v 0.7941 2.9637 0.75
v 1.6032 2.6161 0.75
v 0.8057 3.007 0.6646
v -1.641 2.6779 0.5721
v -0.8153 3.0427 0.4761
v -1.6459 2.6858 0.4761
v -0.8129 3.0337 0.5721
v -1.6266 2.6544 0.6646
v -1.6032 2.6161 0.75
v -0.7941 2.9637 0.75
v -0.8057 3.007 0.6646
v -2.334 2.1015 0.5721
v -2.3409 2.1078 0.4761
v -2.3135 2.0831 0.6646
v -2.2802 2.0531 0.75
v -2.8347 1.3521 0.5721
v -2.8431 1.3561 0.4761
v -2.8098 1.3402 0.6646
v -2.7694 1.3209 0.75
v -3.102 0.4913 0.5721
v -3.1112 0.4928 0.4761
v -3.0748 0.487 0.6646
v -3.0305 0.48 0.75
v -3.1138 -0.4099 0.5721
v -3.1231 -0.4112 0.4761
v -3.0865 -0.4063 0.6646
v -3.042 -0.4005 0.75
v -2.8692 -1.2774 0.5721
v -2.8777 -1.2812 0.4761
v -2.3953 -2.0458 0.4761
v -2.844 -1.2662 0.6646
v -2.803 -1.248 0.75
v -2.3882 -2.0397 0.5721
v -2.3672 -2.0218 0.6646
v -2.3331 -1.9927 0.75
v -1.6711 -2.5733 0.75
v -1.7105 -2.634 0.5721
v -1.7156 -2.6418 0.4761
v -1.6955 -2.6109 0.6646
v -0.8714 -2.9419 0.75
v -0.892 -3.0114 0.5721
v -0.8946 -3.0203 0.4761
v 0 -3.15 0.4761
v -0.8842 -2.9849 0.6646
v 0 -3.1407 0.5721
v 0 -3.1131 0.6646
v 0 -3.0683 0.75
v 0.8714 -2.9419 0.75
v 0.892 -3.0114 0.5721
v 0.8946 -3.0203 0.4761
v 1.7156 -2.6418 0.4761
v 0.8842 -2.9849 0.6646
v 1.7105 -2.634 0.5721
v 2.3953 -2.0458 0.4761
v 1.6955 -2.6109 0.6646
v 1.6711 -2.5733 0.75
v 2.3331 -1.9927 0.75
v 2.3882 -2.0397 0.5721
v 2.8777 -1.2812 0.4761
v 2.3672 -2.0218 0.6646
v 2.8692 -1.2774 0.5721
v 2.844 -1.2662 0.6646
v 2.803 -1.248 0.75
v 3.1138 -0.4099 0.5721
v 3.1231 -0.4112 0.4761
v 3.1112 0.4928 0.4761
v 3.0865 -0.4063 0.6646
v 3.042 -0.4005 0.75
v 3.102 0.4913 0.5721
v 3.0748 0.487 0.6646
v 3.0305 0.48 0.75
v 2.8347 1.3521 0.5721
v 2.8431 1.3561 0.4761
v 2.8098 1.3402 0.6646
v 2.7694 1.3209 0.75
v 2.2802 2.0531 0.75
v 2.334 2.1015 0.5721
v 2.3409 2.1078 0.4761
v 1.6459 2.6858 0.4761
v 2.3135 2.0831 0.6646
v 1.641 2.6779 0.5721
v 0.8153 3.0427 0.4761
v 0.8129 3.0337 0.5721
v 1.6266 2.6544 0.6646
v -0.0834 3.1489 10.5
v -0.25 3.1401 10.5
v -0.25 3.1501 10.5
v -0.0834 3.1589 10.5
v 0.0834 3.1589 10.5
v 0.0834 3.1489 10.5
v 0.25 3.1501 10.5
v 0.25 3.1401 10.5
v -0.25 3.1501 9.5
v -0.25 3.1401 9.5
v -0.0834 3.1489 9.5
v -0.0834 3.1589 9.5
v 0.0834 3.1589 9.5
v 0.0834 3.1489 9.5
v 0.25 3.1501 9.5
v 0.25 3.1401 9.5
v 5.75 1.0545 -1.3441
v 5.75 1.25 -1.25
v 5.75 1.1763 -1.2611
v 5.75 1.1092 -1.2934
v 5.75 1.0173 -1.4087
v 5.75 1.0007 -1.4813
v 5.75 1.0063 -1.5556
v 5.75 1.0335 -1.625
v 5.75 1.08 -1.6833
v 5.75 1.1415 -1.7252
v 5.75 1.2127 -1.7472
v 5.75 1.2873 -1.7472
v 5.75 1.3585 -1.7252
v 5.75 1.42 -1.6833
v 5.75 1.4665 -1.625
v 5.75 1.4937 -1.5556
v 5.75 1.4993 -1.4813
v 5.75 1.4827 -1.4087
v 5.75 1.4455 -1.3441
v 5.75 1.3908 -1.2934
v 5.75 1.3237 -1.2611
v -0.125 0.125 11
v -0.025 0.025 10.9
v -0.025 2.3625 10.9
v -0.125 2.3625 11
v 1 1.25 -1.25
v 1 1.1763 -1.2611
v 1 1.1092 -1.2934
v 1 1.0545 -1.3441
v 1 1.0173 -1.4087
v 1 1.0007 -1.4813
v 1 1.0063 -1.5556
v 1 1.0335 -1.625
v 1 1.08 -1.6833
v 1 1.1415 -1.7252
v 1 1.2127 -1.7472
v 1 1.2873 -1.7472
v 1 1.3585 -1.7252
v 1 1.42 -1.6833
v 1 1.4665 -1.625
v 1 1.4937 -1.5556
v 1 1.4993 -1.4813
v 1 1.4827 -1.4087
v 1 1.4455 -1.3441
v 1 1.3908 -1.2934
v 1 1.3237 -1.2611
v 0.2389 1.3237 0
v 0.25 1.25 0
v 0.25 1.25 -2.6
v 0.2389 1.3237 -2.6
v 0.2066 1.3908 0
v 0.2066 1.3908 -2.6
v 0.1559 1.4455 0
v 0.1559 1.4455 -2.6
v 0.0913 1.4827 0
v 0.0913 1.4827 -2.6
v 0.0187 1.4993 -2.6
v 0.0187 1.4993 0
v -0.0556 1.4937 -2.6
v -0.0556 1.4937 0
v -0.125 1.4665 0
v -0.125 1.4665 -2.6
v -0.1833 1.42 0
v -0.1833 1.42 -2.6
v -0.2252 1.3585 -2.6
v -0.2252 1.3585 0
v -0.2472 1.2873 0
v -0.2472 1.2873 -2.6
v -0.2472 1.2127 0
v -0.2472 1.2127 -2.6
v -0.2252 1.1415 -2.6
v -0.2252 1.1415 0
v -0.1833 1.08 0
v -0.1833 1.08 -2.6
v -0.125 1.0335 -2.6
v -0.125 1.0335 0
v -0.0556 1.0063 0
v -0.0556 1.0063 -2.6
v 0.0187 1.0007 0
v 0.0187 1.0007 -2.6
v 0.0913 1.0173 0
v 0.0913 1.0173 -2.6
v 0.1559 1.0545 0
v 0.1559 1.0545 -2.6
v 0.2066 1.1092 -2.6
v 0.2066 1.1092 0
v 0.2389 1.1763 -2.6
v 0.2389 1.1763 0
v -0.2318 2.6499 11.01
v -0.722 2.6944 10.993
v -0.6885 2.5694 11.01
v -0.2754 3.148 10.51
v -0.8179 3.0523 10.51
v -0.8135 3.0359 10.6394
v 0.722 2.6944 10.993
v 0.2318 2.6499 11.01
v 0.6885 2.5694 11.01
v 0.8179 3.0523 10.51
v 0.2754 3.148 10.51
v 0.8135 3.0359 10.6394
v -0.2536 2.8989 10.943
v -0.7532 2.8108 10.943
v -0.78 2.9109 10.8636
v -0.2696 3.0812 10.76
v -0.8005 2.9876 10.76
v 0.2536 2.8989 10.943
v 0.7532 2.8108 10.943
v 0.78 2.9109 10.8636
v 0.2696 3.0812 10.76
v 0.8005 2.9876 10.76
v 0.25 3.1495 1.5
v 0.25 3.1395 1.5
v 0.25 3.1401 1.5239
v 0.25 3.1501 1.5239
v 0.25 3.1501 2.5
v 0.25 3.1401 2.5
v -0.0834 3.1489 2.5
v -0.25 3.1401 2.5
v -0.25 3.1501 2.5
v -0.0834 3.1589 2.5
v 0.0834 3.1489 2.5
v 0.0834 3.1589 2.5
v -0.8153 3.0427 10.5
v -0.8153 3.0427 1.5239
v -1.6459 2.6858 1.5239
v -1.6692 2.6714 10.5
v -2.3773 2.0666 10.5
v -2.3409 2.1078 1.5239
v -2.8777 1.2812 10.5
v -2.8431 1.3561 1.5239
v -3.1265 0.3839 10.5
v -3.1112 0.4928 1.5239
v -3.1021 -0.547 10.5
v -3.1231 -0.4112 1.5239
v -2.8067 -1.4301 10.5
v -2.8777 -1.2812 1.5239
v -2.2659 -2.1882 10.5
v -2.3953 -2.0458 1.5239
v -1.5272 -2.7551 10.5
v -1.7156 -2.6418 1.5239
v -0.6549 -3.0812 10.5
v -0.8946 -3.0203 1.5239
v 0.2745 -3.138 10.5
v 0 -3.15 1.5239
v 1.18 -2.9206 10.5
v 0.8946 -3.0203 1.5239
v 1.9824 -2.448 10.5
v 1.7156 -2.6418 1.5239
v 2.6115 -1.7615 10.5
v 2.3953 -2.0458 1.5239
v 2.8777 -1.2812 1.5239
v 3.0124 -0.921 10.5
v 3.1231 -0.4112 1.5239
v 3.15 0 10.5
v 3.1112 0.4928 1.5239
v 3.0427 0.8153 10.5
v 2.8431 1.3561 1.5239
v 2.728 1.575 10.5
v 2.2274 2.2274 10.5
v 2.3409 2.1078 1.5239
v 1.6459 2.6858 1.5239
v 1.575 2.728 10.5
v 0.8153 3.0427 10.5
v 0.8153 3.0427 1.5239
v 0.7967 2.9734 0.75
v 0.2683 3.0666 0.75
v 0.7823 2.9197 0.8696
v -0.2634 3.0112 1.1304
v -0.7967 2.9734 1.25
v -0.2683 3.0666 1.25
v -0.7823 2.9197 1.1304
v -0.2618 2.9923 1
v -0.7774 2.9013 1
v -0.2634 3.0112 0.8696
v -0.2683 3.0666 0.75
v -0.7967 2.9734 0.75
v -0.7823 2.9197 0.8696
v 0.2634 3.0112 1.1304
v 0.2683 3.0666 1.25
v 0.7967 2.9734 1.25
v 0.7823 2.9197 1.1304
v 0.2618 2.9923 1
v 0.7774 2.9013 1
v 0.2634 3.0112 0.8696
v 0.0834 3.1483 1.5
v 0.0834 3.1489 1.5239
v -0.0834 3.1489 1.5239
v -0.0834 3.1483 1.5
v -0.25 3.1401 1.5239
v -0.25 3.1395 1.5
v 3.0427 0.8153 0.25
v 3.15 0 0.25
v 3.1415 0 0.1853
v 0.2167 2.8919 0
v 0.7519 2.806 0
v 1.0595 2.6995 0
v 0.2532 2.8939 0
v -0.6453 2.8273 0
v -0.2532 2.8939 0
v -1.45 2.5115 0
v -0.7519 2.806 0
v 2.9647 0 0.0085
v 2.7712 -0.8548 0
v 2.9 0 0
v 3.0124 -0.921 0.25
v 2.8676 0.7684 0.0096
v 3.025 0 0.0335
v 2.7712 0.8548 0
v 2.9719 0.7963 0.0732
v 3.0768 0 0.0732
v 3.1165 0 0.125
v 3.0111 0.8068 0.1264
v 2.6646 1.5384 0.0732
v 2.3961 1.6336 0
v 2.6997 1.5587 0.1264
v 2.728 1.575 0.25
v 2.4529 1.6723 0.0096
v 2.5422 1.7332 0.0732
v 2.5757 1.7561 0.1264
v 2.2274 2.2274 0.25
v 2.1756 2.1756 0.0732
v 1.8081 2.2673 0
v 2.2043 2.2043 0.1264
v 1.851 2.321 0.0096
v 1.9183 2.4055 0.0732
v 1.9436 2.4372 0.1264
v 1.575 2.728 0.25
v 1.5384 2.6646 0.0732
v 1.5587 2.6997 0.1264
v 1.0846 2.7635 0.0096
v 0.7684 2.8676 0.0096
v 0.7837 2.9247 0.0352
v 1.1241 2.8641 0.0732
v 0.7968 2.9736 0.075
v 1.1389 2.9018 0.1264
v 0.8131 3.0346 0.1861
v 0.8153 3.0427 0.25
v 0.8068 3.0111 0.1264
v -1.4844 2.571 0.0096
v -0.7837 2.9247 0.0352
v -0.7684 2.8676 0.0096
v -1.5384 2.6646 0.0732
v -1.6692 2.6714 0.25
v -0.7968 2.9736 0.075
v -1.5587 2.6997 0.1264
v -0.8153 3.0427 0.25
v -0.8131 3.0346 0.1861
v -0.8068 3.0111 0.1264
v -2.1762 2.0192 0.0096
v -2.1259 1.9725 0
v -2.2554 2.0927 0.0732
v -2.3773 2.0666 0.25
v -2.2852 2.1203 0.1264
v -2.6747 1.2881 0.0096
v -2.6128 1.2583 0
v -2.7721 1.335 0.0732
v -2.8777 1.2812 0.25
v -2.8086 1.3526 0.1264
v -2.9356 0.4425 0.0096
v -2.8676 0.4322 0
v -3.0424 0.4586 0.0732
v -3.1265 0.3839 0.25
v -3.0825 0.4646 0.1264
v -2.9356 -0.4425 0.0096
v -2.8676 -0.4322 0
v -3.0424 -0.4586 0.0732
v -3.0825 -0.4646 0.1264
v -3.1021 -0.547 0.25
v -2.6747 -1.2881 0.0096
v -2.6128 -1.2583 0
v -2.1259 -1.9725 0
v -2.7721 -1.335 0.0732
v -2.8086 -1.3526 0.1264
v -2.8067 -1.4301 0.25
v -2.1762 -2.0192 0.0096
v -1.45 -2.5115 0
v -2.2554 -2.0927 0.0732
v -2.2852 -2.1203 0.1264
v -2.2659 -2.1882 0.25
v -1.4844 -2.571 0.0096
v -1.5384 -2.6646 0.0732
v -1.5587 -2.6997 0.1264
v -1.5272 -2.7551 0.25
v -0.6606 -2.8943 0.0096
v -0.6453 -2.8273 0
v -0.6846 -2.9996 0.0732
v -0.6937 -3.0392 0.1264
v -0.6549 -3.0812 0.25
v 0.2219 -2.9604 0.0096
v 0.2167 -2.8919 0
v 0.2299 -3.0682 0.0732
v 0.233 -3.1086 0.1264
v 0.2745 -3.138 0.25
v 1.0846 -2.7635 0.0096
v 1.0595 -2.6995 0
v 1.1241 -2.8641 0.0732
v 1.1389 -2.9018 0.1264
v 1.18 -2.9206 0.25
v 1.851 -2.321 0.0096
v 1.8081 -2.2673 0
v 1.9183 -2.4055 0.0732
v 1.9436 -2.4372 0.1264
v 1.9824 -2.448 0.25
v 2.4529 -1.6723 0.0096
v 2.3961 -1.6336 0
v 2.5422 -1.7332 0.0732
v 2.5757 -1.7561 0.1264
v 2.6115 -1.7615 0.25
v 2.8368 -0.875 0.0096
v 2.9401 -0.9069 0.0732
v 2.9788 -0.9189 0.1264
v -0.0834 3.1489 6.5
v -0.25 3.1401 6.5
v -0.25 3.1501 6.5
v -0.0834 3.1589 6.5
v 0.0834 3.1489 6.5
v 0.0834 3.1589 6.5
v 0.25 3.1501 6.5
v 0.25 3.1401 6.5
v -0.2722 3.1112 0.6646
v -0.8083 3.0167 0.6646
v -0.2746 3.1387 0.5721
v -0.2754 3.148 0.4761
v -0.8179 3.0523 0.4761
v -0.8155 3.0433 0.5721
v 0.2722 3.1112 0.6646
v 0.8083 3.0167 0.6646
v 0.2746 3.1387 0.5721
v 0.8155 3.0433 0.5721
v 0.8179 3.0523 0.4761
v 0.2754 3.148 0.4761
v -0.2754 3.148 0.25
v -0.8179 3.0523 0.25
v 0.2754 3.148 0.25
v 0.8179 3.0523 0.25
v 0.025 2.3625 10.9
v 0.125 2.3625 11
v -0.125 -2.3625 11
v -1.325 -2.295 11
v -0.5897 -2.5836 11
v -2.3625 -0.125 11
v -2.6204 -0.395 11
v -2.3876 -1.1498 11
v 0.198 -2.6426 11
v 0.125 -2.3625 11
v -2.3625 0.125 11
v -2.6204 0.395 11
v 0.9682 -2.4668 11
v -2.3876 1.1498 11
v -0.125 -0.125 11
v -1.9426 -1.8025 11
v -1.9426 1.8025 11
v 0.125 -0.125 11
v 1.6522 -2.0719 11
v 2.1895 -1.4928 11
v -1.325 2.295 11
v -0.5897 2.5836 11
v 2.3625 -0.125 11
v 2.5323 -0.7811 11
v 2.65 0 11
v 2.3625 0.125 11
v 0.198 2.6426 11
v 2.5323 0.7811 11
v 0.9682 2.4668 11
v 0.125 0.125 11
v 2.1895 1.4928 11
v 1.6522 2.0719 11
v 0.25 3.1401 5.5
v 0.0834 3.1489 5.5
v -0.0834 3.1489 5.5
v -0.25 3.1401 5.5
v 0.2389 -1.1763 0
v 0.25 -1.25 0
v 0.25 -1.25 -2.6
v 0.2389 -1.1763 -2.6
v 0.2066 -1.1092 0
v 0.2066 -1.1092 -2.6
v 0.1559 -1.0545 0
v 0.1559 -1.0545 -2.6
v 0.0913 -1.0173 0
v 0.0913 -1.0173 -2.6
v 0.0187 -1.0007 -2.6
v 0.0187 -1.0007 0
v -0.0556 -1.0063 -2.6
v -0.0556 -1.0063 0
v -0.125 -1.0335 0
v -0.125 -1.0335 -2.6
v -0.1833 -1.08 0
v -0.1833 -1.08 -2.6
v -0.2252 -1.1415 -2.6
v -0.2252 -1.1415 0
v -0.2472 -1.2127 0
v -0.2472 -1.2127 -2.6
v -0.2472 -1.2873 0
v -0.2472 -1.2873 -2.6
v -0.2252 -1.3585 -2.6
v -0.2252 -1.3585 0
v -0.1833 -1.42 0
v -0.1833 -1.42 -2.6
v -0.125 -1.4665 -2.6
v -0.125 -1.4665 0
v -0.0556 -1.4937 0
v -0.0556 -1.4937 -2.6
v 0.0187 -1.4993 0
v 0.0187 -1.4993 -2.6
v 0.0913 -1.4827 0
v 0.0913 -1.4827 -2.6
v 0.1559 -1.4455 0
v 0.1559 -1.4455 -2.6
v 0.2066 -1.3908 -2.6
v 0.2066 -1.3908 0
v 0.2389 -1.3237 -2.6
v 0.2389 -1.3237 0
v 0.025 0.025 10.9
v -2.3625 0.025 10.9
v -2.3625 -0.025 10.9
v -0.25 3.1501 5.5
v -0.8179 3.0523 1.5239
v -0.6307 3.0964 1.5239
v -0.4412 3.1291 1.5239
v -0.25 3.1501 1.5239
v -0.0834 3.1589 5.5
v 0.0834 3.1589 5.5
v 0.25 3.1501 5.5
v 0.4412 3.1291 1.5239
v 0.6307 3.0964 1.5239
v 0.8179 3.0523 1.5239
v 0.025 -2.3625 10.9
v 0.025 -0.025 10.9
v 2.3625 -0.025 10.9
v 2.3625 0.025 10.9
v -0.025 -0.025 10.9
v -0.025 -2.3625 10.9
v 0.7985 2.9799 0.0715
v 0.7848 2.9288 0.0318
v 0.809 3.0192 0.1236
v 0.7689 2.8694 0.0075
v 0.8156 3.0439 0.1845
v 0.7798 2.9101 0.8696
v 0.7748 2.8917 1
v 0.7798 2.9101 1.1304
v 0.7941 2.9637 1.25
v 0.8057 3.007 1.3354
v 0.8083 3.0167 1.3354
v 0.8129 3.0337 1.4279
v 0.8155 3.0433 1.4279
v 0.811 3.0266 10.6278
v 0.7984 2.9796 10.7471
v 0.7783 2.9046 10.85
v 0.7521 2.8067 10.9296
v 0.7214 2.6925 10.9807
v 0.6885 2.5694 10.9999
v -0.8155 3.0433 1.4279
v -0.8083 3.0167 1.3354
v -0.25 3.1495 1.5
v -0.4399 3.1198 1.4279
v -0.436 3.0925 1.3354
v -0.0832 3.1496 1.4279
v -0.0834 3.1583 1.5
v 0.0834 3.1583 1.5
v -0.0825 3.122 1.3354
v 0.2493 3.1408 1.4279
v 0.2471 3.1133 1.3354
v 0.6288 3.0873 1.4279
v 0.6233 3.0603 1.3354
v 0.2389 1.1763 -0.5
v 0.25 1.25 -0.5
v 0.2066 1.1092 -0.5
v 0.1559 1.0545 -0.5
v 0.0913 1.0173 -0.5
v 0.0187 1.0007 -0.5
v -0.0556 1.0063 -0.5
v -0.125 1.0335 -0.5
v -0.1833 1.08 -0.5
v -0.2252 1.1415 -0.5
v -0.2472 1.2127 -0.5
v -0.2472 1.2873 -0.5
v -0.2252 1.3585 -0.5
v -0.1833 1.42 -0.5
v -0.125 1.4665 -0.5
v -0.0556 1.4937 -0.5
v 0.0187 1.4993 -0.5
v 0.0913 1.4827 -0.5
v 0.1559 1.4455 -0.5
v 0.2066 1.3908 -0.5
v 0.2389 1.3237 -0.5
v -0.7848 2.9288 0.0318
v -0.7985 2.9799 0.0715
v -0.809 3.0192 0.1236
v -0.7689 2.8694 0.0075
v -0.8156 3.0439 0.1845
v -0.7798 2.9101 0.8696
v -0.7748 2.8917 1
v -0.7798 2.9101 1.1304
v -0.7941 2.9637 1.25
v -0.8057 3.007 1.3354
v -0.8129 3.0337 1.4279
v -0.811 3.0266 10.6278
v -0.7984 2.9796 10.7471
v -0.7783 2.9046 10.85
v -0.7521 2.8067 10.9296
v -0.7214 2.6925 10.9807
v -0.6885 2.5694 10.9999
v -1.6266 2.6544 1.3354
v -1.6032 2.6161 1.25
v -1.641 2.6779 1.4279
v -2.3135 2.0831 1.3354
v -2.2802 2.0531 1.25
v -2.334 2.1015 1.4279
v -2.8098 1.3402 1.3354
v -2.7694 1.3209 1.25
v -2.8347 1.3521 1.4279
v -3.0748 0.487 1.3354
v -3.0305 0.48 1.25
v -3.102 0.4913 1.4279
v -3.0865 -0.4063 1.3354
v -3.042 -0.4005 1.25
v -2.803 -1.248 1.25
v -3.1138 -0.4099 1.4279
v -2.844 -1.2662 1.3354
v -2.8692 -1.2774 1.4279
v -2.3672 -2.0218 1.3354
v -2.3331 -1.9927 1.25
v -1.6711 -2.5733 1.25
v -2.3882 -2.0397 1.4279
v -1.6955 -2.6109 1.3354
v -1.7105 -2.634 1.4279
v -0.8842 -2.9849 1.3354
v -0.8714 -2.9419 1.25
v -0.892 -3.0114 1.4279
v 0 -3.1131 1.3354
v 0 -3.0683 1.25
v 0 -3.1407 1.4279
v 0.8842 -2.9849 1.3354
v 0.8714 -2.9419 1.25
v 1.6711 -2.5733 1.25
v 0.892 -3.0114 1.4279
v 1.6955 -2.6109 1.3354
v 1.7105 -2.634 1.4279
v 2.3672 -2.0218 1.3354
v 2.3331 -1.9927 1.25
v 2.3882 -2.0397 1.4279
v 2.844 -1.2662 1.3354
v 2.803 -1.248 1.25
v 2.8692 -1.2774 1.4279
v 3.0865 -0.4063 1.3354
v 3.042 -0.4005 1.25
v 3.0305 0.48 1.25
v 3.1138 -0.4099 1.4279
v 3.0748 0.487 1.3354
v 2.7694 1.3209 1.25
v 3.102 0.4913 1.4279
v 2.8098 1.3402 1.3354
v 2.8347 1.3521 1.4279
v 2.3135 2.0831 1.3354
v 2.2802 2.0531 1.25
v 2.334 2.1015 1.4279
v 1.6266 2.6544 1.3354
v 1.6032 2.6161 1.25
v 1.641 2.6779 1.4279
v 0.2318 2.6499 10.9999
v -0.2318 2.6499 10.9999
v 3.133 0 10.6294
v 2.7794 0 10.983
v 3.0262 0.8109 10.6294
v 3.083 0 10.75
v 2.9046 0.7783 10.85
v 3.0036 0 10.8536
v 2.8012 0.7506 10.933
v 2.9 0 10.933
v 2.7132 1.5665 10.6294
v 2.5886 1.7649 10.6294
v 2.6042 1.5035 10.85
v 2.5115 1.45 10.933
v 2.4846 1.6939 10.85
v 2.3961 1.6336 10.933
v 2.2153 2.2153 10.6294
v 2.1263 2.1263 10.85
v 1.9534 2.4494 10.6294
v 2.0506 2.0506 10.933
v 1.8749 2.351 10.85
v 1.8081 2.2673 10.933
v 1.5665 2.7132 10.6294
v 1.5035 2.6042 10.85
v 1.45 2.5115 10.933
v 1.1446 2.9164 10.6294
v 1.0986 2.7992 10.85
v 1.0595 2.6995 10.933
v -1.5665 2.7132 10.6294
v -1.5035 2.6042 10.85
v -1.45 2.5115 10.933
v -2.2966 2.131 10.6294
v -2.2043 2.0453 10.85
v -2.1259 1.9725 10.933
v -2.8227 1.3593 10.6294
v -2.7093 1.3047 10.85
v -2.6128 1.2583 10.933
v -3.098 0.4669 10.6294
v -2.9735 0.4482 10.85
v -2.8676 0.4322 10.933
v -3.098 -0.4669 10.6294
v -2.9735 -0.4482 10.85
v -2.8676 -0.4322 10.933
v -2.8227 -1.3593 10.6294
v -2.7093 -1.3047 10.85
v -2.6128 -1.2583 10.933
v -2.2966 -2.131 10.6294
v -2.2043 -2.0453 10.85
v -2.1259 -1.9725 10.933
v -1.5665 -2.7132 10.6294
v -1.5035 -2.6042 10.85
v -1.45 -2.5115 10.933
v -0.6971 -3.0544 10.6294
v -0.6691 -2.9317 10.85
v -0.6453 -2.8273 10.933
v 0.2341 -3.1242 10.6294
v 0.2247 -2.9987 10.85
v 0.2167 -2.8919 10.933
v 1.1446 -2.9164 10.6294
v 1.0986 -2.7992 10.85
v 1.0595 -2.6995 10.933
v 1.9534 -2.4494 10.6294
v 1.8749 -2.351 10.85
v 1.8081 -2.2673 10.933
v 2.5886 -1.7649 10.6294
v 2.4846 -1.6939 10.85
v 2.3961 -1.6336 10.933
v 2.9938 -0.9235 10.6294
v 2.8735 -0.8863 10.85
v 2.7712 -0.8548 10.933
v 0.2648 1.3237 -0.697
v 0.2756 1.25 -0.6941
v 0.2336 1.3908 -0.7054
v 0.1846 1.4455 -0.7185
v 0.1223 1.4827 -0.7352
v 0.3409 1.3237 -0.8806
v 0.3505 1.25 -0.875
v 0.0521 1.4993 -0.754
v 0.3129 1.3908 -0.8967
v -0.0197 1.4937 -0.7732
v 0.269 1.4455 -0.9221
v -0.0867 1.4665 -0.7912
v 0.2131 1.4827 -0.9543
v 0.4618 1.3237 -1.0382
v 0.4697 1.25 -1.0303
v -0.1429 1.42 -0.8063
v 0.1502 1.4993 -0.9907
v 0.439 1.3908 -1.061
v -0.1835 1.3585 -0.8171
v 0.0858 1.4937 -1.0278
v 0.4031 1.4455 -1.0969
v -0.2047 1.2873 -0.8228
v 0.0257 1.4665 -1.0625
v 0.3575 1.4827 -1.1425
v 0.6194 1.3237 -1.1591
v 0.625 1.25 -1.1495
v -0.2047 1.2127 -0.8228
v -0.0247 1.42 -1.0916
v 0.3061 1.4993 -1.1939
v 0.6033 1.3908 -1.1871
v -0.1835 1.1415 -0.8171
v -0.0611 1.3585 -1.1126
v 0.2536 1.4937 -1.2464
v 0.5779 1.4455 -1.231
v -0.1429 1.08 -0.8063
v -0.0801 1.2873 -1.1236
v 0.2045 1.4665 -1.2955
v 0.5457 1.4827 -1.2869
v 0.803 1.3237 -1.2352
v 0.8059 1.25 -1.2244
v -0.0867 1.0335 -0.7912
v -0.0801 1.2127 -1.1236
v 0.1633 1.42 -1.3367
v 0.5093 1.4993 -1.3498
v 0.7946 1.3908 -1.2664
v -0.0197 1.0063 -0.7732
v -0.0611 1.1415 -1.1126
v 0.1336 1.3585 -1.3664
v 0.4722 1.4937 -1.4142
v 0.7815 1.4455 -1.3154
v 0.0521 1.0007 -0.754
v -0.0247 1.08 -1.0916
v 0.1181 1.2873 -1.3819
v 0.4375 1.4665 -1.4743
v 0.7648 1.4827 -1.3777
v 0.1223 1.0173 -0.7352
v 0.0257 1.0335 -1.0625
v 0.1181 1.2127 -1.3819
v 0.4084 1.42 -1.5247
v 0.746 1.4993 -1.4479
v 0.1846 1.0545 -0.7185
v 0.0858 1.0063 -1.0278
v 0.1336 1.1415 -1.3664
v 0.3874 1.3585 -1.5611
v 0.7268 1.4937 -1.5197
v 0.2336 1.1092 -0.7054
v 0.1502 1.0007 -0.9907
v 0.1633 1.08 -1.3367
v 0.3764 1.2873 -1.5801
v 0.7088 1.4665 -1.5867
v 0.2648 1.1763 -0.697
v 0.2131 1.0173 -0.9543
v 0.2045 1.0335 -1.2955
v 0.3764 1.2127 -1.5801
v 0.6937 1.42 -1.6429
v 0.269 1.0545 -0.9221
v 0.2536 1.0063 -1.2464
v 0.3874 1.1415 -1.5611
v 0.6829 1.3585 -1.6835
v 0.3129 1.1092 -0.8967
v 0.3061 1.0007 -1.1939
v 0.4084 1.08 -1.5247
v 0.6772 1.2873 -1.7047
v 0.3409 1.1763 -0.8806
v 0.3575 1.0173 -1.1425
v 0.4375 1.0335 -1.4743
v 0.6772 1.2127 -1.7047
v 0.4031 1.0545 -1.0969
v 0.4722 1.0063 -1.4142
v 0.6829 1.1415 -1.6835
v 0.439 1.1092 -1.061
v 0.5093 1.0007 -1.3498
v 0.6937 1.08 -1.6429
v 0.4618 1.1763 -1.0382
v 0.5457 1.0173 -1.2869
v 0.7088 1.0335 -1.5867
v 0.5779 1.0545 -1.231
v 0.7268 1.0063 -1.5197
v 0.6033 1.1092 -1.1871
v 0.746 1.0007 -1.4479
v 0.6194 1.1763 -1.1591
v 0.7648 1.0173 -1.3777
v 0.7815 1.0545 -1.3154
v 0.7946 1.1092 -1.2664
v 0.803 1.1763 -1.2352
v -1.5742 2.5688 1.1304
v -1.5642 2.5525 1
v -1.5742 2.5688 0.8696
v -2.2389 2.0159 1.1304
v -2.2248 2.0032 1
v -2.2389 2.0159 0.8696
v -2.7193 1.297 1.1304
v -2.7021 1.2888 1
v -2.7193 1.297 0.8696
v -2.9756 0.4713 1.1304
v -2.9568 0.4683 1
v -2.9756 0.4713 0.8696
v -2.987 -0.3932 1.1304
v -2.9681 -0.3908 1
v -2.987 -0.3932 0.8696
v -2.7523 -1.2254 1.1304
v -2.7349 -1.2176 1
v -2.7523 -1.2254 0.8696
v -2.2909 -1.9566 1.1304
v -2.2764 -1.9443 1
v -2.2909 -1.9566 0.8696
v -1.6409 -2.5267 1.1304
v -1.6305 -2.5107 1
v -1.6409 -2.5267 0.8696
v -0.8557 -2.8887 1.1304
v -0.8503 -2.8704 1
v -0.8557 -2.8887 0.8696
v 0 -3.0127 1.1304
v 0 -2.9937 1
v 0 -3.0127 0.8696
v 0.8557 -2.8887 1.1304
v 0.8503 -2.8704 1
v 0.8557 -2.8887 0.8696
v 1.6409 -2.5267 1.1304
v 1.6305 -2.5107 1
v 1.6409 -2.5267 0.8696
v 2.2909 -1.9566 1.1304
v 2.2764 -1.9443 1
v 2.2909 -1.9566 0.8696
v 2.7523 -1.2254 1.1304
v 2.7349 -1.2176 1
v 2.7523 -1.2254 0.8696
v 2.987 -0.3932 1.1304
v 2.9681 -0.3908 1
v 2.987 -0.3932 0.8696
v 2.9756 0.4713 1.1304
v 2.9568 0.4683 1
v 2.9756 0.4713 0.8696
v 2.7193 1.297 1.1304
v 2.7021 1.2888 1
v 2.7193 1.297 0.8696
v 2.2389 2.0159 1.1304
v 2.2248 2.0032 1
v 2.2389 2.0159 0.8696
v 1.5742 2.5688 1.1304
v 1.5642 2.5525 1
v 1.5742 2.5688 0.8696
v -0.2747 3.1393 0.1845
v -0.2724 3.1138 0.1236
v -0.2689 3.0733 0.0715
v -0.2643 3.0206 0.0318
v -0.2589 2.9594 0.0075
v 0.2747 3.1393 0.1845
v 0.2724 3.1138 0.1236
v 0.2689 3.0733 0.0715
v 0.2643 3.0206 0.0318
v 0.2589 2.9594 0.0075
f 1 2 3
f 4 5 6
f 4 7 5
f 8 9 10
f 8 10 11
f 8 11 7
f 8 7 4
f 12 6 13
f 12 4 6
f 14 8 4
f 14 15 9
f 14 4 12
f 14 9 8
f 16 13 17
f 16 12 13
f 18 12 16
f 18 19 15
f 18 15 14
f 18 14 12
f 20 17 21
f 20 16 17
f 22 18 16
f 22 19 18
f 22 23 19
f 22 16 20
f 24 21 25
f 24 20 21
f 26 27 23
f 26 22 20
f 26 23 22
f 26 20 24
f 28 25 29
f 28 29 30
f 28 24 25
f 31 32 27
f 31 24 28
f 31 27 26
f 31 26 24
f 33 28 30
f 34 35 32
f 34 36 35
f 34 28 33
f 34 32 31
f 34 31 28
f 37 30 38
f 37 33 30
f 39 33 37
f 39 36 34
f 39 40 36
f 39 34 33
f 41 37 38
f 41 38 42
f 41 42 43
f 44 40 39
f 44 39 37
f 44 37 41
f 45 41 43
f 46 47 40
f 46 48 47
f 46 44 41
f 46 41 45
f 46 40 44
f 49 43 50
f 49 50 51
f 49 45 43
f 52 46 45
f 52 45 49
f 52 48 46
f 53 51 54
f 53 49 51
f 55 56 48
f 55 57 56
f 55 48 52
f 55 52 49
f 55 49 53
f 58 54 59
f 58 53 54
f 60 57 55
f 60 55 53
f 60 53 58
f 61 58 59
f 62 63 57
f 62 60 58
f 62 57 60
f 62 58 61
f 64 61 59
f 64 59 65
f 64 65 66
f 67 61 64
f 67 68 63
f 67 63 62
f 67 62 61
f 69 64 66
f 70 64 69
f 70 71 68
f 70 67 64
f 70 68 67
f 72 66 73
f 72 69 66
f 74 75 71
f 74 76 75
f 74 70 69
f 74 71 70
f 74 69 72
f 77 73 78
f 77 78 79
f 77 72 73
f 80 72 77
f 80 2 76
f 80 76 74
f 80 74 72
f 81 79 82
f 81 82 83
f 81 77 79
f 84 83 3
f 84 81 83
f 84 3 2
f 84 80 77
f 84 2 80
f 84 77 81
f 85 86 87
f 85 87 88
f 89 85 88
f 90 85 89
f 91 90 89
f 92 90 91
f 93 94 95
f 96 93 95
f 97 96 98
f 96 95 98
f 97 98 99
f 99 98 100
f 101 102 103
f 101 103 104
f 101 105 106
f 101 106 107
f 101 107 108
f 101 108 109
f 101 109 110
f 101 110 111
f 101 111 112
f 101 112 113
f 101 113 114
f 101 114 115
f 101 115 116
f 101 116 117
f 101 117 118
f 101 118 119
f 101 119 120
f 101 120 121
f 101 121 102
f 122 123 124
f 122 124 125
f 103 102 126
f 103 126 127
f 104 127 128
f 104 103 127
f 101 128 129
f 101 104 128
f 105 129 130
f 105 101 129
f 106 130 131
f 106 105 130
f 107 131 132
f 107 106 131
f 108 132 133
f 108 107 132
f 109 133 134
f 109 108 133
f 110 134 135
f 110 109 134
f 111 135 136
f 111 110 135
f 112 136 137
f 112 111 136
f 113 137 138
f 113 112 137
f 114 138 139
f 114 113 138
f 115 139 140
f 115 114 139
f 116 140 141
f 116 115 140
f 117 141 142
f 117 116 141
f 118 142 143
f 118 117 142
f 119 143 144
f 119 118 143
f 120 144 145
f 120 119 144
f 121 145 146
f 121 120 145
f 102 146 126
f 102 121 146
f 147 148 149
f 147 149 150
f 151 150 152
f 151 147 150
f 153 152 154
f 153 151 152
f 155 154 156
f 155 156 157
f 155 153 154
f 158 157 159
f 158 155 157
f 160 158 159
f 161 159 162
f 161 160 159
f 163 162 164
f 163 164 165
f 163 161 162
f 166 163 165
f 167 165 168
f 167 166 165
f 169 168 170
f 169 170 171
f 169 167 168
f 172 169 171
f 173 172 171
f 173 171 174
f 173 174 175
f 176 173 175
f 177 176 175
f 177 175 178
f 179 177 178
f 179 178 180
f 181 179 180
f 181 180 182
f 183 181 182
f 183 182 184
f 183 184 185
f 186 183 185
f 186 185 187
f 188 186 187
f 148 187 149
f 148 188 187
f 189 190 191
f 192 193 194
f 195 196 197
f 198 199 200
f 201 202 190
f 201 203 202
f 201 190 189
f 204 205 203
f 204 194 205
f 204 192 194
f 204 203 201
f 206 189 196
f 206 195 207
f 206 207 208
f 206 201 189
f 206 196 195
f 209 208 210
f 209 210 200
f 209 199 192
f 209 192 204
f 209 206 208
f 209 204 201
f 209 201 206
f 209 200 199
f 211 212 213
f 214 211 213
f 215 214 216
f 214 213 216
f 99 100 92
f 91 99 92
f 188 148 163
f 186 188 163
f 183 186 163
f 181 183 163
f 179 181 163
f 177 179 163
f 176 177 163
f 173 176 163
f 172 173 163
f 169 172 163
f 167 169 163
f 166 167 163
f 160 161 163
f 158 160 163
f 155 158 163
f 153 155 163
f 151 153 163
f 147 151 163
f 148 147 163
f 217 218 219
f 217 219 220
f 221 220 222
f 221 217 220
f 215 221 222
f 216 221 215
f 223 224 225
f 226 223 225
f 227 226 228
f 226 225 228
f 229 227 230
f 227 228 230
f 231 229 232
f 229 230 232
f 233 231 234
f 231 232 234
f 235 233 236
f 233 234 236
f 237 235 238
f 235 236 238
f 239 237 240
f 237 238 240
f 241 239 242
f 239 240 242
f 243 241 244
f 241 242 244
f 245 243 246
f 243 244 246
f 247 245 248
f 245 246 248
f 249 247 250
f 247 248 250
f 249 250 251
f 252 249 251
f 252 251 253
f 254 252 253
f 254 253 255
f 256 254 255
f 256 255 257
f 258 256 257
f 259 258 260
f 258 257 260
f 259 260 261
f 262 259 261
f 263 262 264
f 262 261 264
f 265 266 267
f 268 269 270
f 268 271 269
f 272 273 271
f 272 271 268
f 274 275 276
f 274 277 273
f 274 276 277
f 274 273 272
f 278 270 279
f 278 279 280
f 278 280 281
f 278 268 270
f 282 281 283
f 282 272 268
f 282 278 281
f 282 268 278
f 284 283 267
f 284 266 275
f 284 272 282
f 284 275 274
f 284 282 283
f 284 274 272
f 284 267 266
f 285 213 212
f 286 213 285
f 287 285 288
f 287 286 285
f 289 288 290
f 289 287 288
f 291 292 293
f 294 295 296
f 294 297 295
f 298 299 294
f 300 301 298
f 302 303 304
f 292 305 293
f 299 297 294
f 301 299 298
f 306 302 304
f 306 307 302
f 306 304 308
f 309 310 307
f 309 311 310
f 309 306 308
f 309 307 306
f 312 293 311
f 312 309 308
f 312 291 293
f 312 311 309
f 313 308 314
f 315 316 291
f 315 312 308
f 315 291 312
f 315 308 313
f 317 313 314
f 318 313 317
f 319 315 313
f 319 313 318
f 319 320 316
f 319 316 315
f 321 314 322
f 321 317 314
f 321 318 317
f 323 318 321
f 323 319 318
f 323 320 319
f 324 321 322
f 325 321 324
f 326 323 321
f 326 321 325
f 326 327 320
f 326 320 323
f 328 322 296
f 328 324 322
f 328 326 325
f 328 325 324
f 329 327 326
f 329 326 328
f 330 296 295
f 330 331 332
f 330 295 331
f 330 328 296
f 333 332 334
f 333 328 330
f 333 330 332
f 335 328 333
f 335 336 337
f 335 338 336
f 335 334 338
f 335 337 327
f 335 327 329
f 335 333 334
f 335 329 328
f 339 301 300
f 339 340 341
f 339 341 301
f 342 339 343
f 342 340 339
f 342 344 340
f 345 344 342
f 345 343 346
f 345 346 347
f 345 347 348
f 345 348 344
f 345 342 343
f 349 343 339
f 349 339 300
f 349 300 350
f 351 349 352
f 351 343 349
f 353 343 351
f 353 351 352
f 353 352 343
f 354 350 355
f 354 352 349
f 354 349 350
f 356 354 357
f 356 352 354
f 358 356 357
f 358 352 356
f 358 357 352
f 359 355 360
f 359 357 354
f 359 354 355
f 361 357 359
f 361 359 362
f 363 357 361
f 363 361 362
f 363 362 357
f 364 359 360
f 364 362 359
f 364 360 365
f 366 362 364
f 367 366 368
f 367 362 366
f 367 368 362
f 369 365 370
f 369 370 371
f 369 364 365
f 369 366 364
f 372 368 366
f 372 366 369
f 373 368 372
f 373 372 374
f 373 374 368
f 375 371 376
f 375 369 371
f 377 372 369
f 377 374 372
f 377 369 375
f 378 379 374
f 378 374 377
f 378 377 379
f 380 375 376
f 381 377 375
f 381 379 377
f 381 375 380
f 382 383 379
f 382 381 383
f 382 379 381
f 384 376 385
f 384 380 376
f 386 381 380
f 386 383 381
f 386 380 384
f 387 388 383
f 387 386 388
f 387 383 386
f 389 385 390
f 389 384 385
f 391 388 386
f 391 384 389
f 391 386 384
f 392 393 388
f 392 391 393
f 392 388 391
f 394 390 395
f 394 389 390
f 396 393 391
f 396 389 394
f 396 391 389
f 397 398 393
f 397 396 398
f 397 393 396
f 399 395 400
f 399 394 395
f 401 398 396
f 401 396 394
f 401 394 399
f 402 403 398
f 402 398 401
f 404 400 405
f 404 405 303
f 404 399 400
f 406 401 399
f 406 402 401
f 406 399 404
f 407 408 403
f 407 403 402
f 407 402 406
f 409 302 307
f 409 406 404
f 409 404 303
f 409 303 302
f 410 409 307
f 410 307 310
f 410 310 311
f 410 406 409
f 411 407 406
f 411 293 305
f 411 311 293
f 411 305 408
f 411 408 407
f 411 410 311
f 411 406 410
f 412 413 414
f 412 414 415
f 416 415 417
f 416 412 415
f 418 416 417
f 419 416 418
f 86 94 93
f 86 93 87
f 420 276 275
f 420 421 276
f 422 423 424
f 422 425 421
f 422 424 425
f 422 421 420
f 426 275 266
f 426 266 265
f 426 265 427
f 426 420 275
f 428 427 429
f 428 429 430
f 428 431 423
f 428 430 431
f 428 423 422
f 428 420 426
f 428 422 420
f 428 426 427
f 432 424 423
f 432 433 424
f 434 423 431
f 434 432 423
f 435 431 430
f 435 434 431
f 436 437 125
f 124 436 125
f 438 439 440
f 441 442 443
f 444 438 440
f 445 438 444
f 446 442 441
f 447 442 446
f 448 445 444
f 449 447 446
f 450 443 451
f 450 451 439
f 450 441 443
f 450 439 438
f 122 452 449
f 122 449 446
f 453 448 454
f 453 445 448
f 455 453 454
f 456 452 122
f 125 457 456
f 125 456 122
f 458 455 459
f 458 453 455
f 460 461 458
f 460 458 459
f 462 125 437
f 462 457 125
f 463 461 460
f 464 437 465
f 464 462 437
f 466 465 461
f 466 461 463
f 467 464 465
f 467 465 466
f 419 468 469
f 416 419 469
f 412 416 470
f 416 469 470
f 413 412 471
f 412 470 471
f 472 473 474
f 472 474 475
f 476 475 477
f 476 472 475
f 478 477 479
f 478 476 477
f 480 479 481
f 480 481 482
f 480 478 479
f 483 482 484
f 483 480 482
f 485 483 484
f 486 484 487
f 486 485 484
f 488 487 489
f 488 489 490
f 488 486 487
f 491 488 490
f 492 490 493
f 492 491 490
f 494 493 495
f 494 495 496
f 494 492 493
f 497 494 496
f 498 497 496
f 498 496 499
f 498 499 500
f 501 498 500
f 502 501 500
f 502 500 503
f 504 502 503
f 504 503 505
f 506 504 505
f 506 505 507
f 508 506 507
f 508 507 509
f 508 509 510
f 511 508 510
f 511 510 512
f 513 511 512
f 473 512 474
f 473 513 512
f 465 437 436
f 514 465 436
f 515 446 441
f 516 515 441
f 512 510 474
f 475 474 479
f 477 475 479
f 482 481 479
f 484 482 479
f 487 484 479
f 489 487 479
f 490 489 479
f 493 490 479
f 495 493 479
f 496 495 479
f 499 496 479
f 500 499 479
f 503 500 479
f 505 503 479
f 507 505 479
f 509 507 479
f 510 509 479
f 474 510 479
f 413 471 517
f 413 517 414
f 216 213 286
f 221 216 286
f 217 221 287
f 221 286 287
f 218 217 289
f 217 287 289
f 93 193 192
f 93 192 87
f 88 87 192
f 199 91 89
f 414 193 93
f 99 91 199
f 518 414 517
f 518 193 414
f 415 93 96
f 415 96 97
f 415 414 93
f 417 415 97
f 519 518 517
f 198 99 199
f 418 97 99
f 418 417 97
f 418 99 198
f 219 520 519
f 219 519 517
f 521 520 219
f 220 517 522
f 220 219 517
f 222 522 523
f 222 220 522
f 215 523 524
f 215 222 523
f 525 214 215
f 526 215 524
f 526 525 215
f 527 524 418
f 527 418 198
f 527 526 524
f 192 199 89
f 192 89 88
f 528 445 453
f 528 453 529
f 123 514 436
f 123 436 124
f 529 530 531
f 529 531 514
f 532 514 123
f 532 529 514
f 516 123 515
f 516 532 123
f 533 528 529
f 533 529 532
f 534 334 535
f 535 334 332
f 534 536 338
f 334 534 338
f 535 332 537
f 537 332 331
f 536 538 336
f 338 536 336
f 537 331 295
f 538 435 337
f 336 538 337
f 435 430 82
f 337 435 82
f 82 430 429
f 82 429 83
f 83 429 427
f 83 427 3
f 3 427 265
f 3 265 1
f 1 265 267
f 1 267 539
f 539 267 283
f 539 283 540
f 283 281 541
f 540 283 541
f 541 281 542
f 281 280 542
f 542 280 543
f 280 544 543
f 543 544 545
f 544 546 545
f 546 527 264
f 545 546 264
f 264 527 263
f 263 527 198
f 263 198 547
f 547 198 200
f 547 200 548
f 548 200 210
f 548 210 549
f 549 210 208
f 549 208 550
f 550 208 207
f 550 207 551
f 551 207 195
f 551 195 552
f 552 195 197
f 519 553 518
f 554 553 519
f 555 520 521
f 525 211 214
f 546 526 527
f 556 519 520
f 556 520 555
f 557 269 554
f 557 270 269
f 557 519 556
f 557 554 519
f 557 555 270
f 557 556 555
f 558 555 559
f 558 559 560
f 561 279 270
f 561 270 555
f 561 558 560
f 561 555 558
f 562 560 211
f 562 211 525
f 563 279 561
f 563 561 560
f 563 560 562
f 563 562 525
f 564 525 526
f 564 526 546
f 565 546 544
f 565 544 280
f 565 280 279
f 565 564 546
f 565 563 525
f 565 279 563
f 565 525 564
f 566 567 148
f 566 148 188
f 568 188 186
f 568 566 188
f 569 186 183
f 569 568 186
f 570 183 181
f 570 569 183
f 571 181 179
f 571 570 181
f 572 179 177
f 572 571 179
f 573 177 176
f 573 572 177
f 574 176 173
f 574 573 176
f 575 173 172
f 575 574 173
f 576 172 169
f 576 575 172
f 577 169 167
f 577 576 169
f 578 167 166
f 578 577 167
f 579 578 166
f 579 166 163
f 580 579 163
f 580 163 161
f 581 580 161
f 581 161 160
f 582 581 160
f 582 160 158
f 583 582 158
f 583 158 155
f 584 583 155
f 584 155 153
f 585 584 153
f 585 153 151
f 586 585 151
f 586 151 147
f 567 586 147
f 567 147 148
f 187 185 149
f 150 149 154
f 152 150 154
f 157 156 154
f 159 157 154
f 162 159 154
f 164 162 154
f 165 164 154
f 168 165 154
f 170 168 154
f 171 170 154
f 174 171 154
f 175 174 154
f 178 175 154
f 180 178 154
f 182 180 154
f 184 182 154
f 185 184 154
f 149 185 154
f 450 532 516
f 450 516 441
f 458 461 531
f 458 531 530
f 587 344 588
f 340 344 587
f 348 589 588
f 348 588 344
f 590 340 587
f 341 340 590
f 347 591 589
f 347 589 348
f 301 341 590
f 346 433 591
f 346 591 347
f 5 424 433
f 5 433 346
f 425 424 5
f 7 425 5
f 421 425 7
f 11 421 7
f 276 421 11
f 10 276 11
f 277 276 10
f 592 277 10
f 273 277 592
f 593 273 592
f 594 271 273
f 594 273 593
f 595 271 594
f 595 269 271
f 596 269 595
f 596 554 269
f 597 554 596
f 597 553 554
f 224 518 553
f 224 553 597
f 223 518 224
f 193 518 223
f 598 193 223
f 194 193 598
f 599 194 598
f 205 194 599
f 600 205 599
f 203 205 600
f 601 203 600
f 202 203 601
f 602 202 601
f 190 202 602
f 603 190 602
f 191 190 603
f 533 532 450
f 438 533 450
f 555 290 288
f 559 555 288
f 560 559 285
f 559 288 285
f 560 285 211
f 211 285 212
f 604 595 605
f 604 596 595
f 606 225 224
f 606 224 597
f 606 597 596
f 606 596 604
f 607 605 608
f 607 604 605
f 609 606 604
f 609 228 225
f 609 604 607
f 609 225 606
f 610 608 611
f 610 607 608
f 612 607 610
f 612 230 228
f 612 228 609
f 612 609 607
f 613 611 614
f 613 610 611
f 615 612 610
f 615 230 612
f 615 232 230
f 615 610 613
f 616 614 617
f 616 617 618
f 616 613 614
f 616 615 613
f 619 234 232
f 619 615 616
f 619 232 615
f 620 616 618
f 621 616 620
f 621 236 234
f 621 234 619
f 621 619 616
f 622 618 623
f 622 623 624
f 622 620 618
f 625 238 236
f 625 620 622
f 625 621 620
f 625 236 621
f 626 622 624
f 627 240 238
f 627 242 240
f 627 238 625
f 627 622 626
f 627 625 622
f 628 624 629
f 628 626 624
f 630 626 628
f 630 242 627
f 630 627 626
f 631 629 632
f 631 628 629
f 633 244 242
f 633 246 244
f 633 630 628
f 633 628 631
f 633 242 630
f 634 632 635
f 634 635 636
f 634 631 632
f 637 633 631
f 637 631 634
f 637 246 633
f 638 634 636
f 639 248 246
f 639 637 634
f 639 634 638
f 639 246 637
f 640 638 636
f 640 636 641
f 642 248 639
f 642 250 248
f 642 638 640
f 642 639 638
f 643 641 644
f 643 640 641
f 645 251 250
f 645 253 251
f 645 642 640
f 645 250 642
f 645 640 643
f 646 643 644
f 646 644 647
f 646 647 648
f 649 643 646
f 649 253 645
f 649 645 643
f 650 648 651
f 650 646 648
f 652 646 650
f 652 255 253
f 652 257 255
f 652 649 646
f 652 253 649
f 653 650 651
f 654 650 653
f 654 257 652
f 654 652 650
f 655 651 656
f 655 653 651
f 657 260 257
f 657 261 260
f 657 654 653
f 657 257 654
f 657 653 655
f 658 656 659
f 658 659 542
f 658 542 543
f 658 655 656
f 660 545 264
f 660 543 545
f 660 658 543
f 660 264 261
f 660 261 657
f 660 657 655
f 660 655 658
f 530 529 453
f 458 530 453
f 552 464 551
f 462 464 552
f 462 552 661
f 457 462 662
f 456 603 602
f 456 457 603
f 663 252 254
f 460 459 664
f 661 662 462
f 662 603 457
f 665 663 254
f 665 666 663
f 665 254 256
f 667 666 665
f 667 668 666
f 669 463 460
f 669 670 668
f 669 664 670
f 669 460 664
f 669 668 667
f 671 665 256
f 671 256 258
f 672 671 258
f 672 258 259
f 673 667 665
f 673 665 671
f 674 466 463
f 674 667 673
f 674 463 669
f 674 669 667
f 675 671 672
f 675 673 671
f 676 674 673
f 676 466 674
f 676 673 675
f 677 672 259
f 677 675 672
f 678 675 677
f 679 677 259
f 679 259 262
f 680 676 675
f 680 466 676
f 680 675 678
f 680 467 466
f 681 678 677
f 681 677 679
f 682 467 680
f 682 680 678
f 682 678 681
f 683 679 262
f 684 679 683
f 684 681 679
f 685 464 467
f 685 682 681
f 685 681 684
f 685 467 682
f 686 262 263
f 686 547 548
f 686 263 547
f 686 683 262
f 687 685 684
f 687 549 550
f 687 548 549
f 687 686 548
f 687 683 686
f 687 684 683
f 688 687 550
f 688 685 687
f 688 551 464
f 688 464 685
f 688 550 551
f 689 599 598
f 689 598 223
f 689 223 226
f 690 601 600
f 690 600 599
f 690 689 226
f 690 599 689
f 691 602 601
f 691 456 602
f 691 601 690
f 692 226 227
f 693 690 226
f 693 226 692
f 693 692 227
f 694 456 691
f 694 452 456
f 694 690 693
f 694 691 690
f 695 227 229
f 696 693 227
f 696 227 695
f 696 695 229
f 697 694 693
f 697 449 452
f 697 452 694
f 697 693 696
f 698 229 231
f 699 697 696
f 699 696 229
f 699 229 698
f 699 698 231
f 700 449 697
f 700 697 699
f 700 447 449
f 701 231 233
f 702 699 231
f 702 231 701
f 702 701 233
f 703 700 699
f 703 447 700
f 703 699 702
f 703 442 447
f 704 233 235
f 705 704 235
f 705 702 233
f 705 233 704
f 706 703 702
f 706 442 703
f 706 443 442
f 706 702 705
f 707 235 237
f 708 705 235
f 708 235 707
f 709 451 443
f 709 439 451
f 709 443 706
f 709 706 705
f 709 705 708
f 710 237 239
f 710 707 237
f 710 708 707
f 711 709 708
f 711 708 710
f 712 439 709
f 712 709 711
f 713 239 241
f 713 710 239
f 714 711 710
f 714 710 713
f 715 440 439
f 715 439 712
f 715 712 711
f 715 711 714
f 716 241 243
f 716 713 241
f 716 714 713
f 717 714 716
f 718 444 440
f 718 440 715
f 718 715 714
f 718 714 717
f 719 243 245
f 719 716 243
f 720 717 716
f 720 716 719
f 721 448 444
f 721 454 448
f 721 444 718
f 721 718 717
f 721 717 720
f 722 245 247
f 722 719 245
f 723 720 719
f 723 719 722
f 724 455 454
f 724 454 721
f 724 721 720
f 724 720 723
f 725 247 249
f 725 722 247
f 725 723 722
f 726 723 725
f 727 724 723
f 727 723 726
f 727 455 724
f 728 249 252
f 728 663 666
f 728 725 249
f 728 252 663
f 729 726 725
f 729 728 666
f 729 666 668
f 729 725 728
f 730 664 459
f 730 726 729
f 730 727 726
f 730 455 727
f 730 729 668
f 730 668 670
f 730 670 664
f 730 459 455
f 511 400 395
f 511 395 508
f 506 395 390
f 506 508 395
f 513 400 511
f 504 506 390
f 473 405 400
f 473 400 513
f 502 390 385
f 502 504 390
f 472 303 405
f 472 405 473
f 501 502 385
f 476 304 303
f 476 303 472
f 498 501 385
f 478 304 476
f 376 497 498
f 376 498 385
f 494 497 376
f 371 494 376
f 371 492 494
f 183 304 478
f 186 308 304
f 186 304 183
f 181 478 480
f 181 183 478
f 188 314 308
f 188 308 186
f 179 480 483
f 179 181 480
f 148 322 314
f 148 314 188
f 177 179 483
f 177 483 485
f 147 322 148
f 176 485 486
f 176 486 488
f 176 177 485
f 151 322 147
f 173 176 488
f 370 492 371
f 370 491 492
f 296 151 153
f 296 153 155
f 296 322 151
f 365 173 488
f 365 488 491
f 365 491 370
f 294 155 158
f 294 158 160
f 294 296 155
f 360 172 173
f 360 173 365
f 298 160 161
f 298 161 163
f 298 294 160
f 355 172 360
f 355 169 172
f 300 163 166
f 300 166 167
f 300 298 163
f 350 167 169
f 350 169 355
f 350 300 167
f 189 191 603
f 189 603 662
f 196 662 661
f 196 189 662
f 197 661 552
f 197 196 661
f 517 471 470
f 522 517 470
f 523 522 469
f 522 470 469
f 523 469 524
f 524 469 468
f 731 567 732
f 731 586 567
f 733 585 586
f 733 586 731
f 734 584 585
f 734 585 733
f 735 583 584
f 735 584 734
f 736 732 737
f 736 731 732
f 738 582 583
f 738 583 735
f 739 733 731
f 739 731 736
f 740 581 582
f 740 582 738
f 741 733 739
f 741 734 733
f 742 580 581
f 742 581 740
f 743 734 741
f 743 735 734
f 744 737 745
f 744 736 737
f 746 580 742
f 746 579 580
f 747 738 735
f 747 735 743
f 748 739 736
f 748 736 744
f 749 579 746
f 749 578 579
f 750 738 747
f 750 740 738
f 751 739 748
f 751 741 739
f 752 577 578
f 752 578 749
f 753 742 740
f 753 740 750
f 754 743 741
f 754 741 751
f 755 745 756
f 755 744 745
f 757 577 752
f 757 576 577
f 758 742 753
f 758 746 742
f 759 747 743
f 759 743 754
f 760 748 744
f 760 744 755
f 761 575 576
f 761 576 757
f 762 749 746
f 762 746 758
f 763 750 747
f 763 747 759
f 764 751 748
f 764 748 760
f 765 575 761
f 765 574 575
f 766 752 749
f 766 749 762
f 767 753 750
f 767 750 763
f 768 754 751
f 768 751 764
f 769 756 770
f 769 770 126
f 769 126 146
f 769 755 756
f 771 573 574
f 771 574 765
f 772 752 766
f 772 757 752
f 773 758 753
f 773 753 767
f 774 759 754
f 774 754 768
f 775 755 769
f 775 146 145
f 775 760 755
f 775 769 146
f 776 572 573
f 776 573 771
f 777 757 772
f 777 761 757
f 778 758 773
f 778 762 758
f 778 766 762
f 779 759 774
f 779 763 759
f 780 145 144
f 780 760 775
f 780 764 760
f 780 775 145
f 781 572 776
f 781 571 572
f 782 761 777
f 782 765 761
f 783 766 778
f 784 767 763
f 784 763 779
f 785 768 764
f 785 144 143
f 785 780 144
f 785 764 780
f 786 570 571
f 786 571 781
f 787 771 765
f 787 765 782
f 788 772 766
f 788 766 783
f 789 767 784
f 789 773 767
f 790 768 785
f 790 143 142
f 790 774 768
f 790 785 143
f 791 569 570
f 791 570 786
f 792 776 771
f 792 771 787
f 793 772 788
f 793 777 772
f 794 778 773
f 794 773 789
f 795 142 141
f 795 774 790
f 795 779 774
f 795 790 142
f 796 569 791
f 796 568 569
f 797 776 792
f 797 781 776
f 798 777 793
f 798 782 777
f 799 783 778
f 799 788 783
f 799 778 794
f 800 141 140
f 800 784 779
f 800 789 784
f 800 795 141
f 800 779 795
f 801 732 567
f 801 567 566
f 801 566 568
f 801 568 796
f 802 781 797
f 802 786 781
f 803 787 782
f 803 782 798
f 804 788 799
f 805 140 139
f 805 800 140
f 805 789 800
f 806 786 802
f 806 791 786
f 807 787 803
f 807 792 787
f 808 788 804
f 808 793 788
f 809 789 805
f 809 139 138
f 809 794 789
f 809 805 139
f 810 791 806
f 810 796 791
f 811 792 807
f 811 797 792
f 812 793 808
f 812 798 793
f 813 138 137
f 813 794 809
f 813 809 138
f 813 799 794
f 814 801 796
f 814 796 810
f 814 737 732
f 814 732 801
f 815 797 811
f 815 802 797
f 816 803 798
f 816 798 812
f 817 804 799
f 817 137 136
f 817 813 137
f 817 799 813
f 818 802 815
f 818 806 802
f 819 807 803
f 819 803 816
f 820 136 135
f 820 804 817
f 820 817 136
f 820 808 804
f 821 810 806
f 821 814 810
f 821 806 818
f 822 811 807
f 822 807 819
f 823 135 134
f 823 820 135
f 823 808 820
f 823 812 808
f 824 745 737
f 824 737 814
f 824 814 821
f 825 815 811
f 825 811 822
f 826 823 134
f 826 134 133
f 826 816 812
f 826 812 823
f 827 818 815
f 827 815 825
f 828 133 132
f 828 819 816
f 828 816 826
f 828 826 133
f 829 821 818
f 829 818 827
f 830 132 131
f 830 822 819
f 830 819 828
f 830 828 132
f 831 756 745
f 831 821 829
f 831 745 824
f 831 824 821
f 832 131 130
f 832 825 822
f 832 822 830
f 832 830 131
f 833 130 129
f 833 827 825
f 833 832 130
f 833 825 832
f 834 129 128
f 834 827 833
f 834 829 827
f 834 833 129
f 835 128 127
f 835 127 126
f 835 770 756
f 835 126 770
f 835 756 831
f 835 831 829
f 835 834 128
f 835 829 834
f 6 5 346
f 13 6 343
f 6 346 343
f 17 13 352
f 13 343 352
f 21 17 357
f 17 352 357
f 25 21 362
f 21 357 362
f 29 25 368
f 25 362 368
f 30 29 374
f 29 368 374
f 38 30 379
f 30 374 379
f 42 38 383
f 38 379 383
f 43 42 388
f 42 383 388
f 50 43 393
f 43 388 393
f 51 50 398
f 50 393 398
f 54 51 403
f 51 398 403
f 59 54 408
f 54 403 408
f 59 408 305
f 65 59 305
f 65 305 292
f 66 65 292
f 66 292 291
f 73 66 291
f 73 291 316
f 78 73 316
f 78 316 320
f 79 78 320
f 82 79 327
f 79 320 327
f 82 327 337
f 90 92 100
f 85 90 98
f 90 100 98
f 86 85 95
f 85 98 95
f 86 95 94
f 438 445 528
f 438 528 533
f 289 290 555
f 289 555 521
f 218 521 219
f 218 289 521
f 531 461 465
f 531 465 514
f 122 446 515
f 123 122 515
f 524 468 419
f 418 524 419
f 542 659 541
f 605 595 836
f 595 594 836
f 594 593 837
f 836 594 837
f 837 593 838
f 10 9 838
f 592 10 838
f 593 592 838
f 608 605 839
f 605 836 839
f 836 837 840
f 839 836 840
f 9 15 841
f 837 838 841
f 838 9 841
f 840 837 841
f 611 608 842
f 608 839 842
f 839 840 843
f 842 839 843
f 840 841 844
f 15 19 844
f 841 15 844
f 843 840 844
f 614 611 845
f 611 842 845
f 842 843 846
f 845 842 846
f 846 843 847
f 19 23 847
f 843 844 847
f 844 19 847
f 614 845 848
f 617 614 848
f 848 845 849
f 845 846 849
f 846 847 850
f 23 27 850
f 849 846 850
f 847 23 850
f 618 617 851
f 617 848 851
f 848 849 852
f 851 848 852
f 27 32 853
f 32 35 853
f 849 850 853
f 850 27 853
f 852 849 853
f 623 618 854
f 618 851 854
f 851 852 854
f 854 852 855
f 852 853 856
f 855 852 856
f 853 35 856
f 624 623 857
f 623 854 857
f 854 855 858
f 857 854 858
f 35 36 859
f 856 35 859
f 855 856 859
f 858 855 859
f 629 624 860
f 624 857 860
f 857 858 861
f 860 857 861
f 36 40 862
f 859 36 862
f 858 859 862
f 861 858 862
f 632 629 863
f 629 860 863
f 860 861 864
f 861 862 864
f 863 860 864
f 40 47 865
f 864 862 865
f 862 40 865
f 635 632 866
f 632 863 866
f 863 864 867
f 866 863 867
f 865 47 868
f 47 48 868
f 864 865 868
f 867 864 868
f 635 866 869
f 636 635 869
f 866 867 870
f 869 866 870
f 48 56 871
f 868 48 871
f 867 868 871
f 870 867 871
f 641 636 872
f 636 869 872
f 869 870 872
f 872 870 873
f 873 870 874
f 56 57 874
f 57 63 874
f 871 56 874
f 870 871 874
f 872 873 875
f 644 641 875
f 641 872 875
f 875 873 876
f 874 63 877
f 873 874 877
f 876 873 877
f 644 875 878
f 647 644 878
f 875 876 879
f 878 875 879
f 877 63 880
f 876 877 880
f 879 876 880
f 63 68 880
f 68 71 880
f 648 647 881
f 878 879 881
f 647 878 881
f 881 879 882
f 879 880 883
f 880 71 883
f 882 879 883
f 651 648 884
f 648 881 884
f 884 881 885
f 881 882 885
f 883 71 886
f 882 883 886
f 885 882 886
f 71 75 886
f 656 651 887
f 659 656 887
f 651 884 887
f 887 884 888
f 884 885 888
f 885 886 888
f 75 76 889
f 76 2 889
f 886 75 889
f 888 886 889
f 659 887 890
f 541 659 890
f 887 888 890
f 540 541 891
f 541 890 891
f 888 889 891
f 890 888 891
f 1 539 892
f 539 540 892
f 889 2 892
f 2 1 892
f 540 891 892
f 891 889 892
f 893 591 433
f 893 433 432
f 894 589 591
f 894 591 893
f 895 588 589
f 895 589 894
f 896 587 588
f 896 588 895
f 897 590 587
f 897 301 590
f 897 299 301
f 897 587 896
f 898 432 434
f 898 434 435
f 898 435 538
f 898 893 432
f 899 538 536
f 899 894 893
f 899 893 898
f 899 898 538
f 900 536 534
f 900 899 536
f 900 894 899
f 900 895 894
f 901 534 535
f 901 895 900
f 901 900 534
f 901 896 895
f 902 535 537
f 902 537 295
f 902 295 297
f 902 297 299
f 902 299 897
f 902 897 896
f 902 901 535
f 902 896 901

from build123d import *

# Parameters (mm, degrees)
SKETCH003_R         = 0.25
REVOLUTION001_ANGLE = -30
SKETCH015_W         = 0.5
SKETCH015_H         = 1
POCKET002_DEPTH     = 3.161
LINEARPATTERN_COUNT = 3
LINEARPATTERN_PITCH = 4
SKETCH010_R         = 0.25
PAD002_DEPTH        = 2.6
SKETCH013_R         = 2.65
PAD_DEPTH           = 0.5
POCKET001_DEPTH     = 2.3625
POLARPATTERN_COUNT  = 3
POLARPATTERN_ANGLE  = 180
SKETCH012_R         = 2.65
POCKET_DEPTH        = 0.5


with BuildPart() as leadangledclone:
    # AdditivePipe: sweep along a path in Sketch004
    with BuildLine(Plane.XZ) as additivepipe_path:
        Line((0, 0), (0, -0.5))
        ThreePointArc((0, -0.5), (0.292893, -1.207107), (1, -1.5))
        Line((1, -1.5), (5.75, -1.5))
    # Sketch003 (on ShapeBinder) → AdditivePipe (sweep)
    with BuildSketch(Plane(origin=(0, 0, 0), x_dir=(1, 0, 0), z_dir=(0, 0, -1))):
        with Locations((0, 1.25)):
            Circle(SKETCH003_R)
    sweep(path=additivepipe_path.line)


with BuildPart() as leadangledclone_1:
    # Body003 placement: moved
    add(leadangledclone.part.moved(Location((0, 2.5, 0))))


with BuildPart() as polaritymarking:
    # Sketch005 → Revolution001 (revolve)
    with BuildSketch(Plane(origin=(0, 0, 0), x_dir=(-0.258819, 0.965926, 0), z_dir=(0.965926, 0.258819, 0))):
        with BuildLine():
            Line((2.66, 0.25), (2.66, 11.01))
            ThreePointArc((2.66, 11.01), (3.013553, 10.863553), (3.16, 10.51))
            Line((3.16, 10.51), (3.16, 1.523941))
            ThreePointArc((3.16, 1.523941), (3.139134, 1.381006), (3.078278, 1.25))
            ThreePointArc((3.078278, 1.25), (3.003698, 1), (3.078278, 0.75))
            ThreePointArc((3.078278, 0.75), (3.139134, 0.618994), (3.16, 0.476059))
            Line((3.16, 0.476059), (3.16, 0.25))
            ThreePointArc((3.16, 0.25), (2.91, 0), (2.66, 0.25))
        make_face()
    revolve(axis=Axis((0, 0, 0), (0, 0, 1)), revolution_arc=REVOLUTION001_ANGLE)

    # Sketch015 → Pocket002 (cut, through all)
    with BuildSketch(Plane.XZ):
        with Locations((0, 2)):
            Rectangle(SKETCH015_W, SKETCH015_H)
    pocket002 = extrude(amount=-POCKET002_DEPTH, mode=Mode.SUBTRACT)

    # LinearPattern: Pocket002 ×3
    with Locations(*[(0, 0, i * LINEARPATTERN_PITCH) for i in range(1, LINEARPATTERN_COUNT)]):
        add(pocket002, mode=Mode.SUBTRACT)


with BuildPart() as leadstraight:
    # Sketch010 → Pad002 (new body)
    with BuildSketch(Plane(origin=(0, 1.25, 0), x_dir=(1, 0, 0), z_dir=(0, 0, 1))):
        Circle(SKETCH010_R)
    extrude(amount=-PAD002_DEPTH)


with BuildPart() as leadstraightclone:
    # Body007 base: copy of LeadStraight
    add(leadstraight.part)


with BuildPart() as leadstraightclone_1:
    # Body007 placement: moved
    add(leadstraightclone.part.moved(Location((0, -2.5, 0))))


with BuildPart() as housingtop:
    # Sketch013 (on ShapeBinder) → Pad (new body)
    with BuildSketch(Plane.XY.offset(10.5)):
        Circle(SKETCH013_R)
    extrude(amount=PAD_DEPTH)

    # Sketch014 → Pocket001 (cut, symmetric)
    with BuildSketch(Plane.XZ):
        Polygon((-0.125, 11), (0.125, 11), (0.025, 10.9), (-0.025, 10.9), align=None)
    pocket001 = extrude(amount=POCKET001_DEPTH, both=True, mode=Mode.SUBTRACT)

    # PolarPattern: Pocket001 ×3 about axis
    polarpattern_axis = Axis((0, 0, 0), (0, 0, 1))
    for i in range(1, POLARPATTERN_COUNT):
        add(pocket001.rotate(polarpattern_axis, i * POLARPATTERN_ANGLE / (POLARPATTERN_COUNT - 1)), mode=Mode.SUBTRACT)


with BuildPart() as fusion:
    # Sketch → Revolution (revolve)
    with BuildSketch(Plane.XZ):
        with BuildLine():
            Line((0, 11), (2.65, 11))
            ThreePointArc((3.15, 10.5), (3.003553, 10.853553), (2.65, 11))
            Line((3.15, 10.5), (3.15, 1.523941))
            ThreePointArc((3.068278, 1.25), (3.129134, 1.381006), (3.15, 1.523941))
            ThreePointArc((3.068278, 1.25), (2.993698, 1), (3.068278, 0.75))
            ThreePointArc((3.15, 0.476059), (3.129134, 0.618994), (3.068278, 0.75))
            Line((3.15, 0.476059), (3.15, 0.25))
            ThreePointArc((2.9, 0), (3.076777, 0.073223), (3.15, 0.25))
            Line((0, 0), (2.9, 0))
            Line((0, 11), (0, 0))
        make_face()
    revolve(axis=Axis((0, 0, 0), (0, 0, 1)))

    # Sketch012 → Pocket (cut)
    with BuildSketch(Plane.XY.offset(11)):
        Circle(SKETCH012_R)
    extrude(amount=-POCKET_DEPTH, mode=Mode.SUBTRACT)

    # Fusion: union PolarityMarking, LeadStraight, LeadStraightClone, HousingTop
    add(polaritymarking.part)
    add(leadstraight.part)
    add(leadstraightclone_1.part)
    add(housingtop.part)


solid = Compound([leadangledclone_1.part, fusion.part])
